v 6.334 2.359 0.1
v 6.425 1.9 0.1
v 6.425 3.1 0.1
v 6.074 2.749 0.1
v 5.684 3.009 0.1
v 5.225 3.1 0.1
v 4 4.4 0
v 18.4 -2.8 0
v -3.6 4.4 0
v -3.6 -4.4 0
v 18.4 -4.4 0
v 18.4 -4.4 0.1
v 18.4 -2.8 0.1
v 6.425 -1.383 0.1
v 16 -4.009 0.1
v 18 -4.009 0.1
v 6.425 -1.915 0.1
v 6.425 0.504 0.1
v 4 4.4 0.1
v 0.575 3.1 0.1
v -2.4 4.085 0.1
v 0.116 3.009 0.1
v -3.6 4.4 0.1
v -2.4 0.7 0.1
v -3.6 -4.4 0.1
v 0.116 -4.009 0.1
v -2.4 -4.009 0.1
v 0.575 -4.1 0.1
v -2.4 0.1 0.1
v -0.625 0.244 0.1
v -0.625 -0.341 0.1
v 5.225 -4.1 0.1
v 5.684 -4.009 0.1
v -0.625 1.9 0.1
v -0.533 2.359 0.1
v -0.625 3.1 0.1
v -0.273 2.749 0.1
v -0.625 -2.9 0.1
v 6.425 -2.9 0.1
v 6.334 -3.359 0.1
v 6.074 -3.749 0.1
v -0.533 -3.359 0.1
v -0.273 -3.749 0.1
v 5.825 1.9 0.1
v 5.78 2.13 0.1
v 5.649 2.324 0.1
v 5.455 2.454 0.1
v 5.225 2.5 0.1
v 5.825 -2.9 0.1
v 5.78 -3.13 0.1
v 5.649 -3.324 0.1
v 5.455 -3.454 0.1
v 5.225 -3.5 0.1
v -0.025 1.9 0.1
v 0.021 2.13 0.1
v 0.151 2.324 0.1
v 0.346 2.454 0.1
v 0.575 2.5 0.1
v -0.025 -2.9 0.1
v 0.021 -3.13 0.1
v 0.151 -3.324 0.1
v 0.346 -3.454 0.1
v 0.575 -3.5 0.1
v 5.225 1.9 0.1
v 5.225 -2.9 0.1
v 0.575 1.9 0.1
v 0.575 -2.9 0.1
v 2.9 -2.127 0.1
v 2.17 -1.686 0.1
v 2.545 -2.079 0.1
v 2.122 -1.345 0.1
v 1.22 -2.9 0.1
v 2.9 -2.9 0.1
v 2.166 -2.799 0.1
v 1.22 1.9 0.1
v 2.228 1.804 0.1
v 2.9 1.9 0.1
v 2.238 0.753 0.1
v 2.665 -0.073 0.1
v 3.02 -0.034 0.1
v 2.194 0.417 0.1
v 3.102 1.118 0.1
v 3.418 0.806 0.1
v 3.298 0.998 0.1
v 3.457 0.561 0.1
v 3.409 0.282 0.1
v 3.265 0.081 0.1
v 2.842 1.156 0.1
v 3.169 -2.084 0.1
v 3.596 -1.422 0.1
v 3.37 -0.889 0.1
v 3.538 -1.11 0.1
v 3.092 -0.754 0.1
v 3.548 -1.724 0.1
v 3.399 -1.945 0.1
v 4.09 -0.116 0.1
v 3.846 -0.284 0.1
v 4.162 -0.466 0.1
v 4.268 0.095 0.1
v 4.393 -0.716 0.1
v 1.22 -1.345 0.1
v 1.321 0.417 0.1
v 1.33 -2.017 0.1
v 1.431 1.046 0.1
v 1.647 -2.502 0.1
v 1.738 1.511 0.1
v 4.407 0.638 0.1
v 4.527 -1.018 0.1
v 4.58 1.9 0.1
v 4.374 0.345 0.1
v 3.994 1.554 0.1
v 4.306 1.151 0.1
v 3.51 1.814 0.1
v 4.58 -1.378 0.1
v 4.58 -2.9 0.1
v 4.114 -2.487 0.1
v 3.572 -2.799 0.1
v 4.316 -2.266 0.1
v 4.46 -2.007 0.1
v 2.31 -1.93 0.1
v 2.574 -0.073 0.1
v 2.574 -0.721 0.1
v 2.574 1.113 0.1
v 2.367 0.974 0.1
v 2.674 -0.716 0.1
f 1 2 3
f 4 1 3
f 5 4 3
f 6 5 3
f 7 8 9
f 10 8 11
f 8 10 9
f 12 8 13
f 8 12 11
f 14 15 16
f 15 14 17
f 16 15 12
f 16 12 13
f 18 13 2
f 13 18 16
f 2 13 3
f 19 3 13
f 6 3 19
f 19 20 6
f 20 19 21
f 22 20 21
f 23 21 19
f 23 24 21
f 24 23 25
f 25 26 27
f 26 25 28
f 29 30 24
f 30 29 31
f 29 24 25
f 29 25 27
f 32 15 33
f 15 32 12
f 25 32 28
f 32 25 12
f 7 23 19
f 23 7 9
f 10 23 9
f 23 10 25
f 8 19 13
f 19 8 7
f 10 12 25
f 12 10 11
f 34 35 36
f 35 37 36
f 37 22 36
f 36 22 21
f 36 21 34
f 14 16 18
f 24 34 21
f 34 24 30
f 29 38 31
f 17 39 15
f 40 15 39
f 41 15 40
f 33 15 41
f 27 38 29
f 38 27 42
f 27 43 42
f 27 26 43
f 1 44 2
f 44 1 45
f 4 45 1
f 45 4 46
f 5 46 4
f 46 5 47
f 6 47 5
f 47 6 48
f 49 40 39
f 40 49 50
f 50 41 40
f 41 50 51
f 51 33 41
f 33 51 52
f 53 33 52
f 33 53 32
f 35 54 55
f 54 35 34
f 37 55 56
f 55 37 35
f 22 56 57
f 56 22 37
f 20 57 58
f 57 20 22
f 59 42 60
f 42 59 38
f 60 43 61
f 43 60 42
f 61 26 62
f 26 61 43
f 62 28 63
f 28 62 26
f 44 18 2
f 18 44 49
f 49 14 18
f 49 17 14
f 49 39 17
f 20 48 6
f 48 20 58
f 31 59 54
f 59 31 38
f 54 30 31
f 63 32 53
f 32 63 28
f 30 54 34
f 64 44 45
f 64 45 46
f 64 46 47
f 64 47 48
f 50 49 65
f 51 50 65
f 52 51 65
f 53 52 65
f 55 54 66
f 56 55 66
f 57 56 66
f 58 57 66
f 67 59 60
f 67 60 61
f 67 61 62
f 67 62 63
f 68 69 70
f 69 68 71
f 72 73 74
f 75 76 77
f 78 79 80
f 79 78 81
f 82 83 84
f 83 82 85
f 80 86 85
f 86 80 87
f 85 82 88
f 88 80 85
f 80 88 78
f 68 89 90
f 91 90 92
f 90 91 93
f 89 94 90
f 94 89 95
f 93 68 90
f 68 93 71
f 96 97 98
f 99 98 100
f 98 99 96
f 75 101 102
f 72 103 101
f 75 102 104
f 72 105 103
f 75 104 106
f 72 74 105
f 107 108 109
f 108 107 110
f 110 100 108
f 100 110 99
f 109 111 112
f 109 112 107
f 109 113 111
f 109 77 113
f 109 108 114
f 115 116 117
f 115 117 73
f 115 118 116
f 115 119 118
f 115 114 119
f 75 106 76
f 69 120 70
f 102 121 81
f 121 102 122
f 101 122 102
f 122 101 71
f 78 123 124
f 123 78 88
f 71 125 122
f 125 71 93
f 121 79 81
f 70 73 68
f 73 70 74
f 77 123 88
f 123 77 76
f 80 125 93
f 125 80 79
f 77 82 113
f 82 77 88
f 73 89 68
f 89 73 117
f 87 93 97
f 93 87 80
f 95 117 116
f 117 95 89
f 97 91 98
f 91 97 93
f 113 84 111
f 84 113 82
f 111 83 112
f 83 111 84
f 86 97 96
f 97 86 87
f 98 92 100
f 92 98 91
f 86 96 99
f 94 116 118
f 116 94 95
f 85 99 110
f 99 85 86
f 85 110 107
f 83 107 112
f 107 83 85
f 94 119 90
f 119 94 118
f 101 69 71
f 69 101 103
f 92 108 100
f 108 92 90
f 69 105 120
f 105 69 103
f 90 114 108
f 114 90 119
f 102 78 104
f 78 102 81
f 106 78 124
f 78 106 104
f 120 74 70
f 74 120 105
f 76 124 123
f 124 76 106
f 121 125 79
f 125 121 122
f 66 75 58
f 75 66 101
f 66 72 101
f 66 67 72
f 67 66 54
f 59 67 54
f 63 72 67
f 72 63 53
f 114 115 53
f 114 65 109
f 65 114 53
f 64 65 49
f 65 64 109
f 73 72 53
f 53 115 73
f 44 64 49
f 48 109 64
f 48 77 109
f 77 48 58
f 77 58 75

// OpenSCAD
// file: ../p/1-4ndis.scad
use <../lib.scad>
function ldraw_lib__1_4ndis() = [
// 0 Disc Negative 0.25
// 0 Name: 1-4ndis.dat
// 0 Author: James Jessiman
// 0 !LDRAW_ORG Primitive UPDATE 2012-01
// 0 !LICENSE Licensed under CC BY 4.0 : see CAreadme.txt
// 
// 0 BFC CERTIFY CCW
  [0,"BFC","CERTIFY"],
  [0,"BFC","CCW"],
// 
// 0 !HISTORY 2002-03-23 [sbliss] Added BFC Statement
// 0 !HISTORY 2002-04-25 [PTadmin] Official Update 2002-02
// 0 !HISTORY 2007-06-22 [PTadmin] Header formatted for Contributor Agreement
// 0 !HISTORY 2008-07-01 [PTadmin] Official Update 2008-01
// 0 !HISTORY 2012-02-16 [Philo] Changed to CCW
// 0 !HISTORY 2012-03-30 [PTadmin] Official Update 2012-01
// 
// 
// 3 16 0.9239 0 0.3827 1 0 0 1 0 1
  [3,16,0.9239,0,0.3827,1,0,0,1,0,1],
// 3 16 0.7071 0 0.7071 0.9239 0 0.3827 1 0 1
  [3,16,0.7071,0,0.7071,0.9239,0,0.3827,1,0,1],
// 3 16 0.3827 0 0.9239 0.7071 0 0.7071 1 0 1
  [3,16,0.3827,0,0.9239,0.7071,0,0.7071,1,0,1],
// 3 16 0 0 1 0.3827 0 0.9239 1 0 1
  [3,16,0,0,1,0.3827,0,0.9239,1,0,1],
];
module ldraw_lib__1_4ndis(step=0, col=false, unit=2/5, alt=false, line=0.2, solid=!$preview)
    makepoly(ldraw_lib__1_4ndis(), step=step, col=col, unit=unit, alt=alt, line=line, solid=solid);
ldraw_lib__1_4ndis(line=0.2);
// file: ../p/3-16ndis.scad
use <../lib.scad>
function ldraw_lib__3_16ndis() = [
// 0 Disc Negative 0.1875
// 0 Name: 3-16ndis.dat
// 0 Author: Guy Vivan [guyvivan]
// 0 !LDRAW_ORG Primitive UPDATE 2009-01
// 0 !LICENSE Licensed under CC BY 2.0 and CC BY 4.0 : see CAreadme.txt
// 
// 0 BFC CERTIFY CCW
  [0,"BFC","CERTIFY"],
  [0,"BFC","CCW"],
// 
// 0 !HISTORY 2009-05-02 [PTadmin] Official Update 2009-01
// 
// 
// 3 16 1 0 1 0.9239 0 0.3827 1 0 0
  [3,16,1,0,1,0.9239,0,0.3827,1,0,0],
// 3 16 1 0 1 0.7071 0 0.7071 0.9239 0 0.3827
  [3,16,1,0,1,0.7071,0,0.7071,0.9239,0,0.3827],
// 3 16 1 0 1 0.3827 0 0.9239 0.7071 0 0.7071
  [3,16,1,0,1,0.3827,0,0.9239,0.7071,0,0.7071],
// 
// 0 end of file
// 
];
module ldraw_lib__3_16ndis(step=0, col=false, unit=2/5, alt=false, line=0.2, solid=!$preview)
    makepoly(ldraw_lib__3_16ndis(), step=step, col=col, unit=unit, alt=alt, line=line, solid=solid);
ldraw_lib__3_16ndis(line=0.2);
// file: ../p/1-4ring1.scad
use <../lib.scad>
function ldraw_lib__1_4ring1() = [
// 0 Ring  1 x 0.25
// 0 Name: 1-4ring1.dat
// 0 Author: Chris Dee [cwdee]
// 0 !LDRAW_ORG Primitive UPDATE 2012-01
// 0 !LICENSE Licensed under CC BY 2.0 and CC BY 4.0 : see CAreadme.txt
// 
// 0 BFC CERTIFY CCW
  [0,"BFC","CERTIFY"],
  [0,"BFC","CCW"],
// 
// 0 !HISTORY 2000-05-07 [PTadmin] Official Update 2000-01
// 0 !HISTORY 2002-11-22 [hafhead] Added BFC statement
// 0 !HISTORY 2002-11-30 [PTadmin] Official Update 2002-05
// 0 !HISTORY 2007-06-22 [PTadmin] Header formatted for Contributor Agreement
// 0 !HISTORY 2008-07-01 [PTadmin] Official Update 2008-01
// 0 !HISTORY 2012-02-16 [Philo] Changed to CCW
// 0 !HISTORY 2012-03-30 [PTadmin] Official Update 2012-01
// 
// 
// 4 16 2 0 0 1.8478 0 0.7654 0.9239 0 0.3827 1 0 0
  [4,16,2,0,0,1.8478,0,0.7654,0.9239,0,0.3827,1,0,0],
// 4 16 1.8478 0 0.7654 1.4142 0 1.4142 0.7071 0 0.7071 0.9239 0 0.3827
  [4,16,1.8478,0,0.7654,1.4142,0,1.4142,0.7071,0,0.7071,0.9239,0,0.3827],
// 4 16 1.4142 0 1.4142 0.7654 0 1.8478 0.3827 0 0.9239 0.7071 0 0.7071
  [4,16,1.4142,0,1.4142,0.7654,0,1.8478,0.3827,0,0.9239,0.7071,0,0.7071],
// 4 16 0.7654 0 1.8478 0 0 2 0 0 1 0.3827 0 0.9239
  [4,16,0.7654,0,1.8478,0,0,2,0,0,1,0.3827,0,0.9239],
];
module ldraw_lib__1_4ring1(step=0, col=false, unit=2/5, alt=false, line=0.2, solid=!$preview)
    makepoly(ldraw_lib__1_4ring1(), step=step, col=col, unit=unit, alt=alt, line=line, solid=solid);
ldraw_lib__1_4ring1(line=0.2);
// file: ../p/1-4disc.scad
use <../lib.scad>
function ldraw_lib__1_4disc() = [
// 0 Disc 0.25
// 0 Name: 1-4disc.dat
// 0 Author: James Jessiman
// 0 !LDRAW_ORG Primitive UPDATE 2002-02
// 0 !LICENSE Licensed under CC BY 4.0 : see CAreadme.txt
// 
// 0 BFC CERTIFY CCW
  [0,"BFC","CERTIFY"],
  [0,"BFC","CCW"],
// 
// 0 !HISTORY 2002-03-23 [sbliss] Added BFC statement.
// 0 !HISTORY 2002-04-25 [PTadmin] Official Update 2002-02
// 0 !HISTORY 2007-06-22 [PTadmin] Header formatted for Contributor Agreement
// 0 !HISTORY 2008-07-01 [PTadmin] Official Update 2008-01
// 
// 
// 3 16 0 0 0 1 0 0 0.9239 0 0.3827
  [3,16,0,0,0,1,0,0,0.9239,0,0.3827],
// 3 16 0 0 0 0.9239 0 0.3827 0.7071 0 0.7071
  [3,16,0,0,0,0.9239,0,0.3827,0.7071,0,0.7071],
// 3 16 0 0 0 0.7071 0 0.7071 0.3827 0 0.9239
  [3,16,0,0,0,0.7071,0,0.7071,0.3827,0,0.9239],
// 3 16 0 0 0 0.3827 0 0.9239 0 0 1
  [3,16,0,0,0,0.3827,0,0.9239,0,0,1],
// 0
];
module ldraw_lib__1_4disc(step=0, col=false, unit=2/5, alt=false, line=0.2, solid=!$preview)
    makepoly(ldraw_lib__1_4disc(), step=step, col=col, unit=unit, alt=alt, line=line, solid=solid);
ldraw_lib__1_4disc(line=0.2);
// file: ../p/type-swiss721bt-bold-n3.scad
use <../lib.scad>
function ldraw_lib__type_swiss721bt_bold_n3() = [
// 0 Type Swiss721BT Number "3" Bold
// 0 Name: type-swiss721bt-bold-n3.dat
// 0 Author: Ulrich Röder [UR]
// 0 !LDRAW_ORG Primitive UPDATE 2019-01
// 0 !LICENSE Licensed under CC BY 4.0 : see CAreadme.txt
// 
// 0 BFC CERTIFY CCW
  [0,"BFC","CERTIFY"],
  [0,"BFC","CCW"],
// 
// 0 !HISTORY 2019-06-28 [PTadmin] Official Update 2019-01
// 
// 
// 0 // Main
// 4 16 -.074 0 -.329 0 0 -.339 -.162 0 -.176 -.152 0 -.247
  [4,16,-.074,0,-.329,0,0,-.339,-.162,0,-.176,-.152,0,-.247],
// 3 16 -.35 0 -.5 0 0 -.5 -.153 0 -.479
  [3,16,-.35,0,-.5,0,0,-.5,-.153,0,-.479],
// 3 16 -.35 0 .5 -.14 0 .48 0 0 .5
  [3,16,-.35,0,.5,-.14,0,.48,0,0,.5],
// 4 16 -.049 0 .089 .025 0 .097 -.138 0 .261 -.147 0 .191
  [4,16,-.049,0,.089,.025,0,.097,-.138,0,.261,-.147,0,.191],
// 4 16 .116 0 .221 .108 0 .272 .083 0 .312 .042 0 .337
  [4,16,.116,0,.221,.108,0,.272,.083,0,.312,.042,0,.337],
// 4 16 .076 0 .121 .106 0 .163 .116 0 .221 .025 0 .097
  [4,16,.076,0,.121,.106,0,.163,.116,0,.221,.025,0,.097],
// 3 16 .116 0 .221 .042 0 .337 -.012 0 .345
  [3,16,.116,0,.221,.042,0,.337,-.012,0,.345],
// 4 16 -.138 0 .261 .025 0 .097 .116 0 .221 -.012 0 .345
  [4,16,-.138,0,.261,.025,0,.097,.116,0,.221,-.012,0,.345],
// 3 16 0 0 -.339 .056 0 -.33 .145 0 -.192
  [3,16,0,0,-.339,.056,0,-.33,.145,0,-.192],
// 4 16 .098 0 -.081 .04 0 -.053 .145 0 -.192 .133 0 -.127
  [4,16,.098,0,-.081,.04,0,-.053,.145,0,-.192,.133,0,-.127],
// 4 16 .104 0 -.301 .135 0 -.255 .145 0 -.192 .056 0 -.33
  [4,16,.104,0,-.301,.135,0,-.255,.145,0,-.192,.056,0,-.33],
// 4 16 -.162 0 -.176 0 0 -.339 .145 0 -.192 .04 0 -.053
  [4,16,-.162,0,-.176,0,0,-.339,.145,0,-.192,.04,0,-.053],
// 3 16 .248 0 .08 .197 0 .045 .263 0 .007
  [3,16,.248,0,.08,.197,0,.045,.263,0,.007],
// 4 16 .311 0 -.045 .285 0 .124 .248 0 .08 .263 0 .007
  [4,16,.311,0,-.045,.285,0,.124,.248,0,.08,.263,0,.007],
// 3 16 -.35 0 .5 -.35 0 -.176 -.329 0 .191
  [3,16,-.35,0,.5,-.35,0,-.176,-.329,0,.191],
// 3 16 -.35 0 -.5 -.327 0 -.316 -.35 0 -.176
  [3,16,-.35,0,-.5,-.327,0,-.316,-.35,0,-.176],
// 3 16 -.35 0 .5 -.329 0 .191 -.306 0 .322
  [3,16,-.35,0,.5,-.329,0,.191,-.306,0,.322],
// 3 16 -.35 0 -.5 -.261 0 -.417 -.327 0 -.316
  [3,16,-.35,0,-.5,-.261,0,-.417,-.327,0,-.316],
// 3 16 -.35 0 .5 -.306 0 .322 -.242 0 .419
  [3,16,-.35,0,.5,-.306,0,.322,-.242,0,.419],
// 3 16 -.35 0 -.5 -.153 0 -.479 -.261 0 -.417
  [3,16,-.35,0,-.5,-.153,0,-.479,-.261,0,-.417],
// 4 16 .35 0 .5 .314 0 .237 .307 0 .176 .339 0 -.108
  [4,16,.35,0,.5,.314,0,.237,.307,0,.176,.339,0,-.108],
// 4 16 .285 0 .124 .311 0 -.045 .339 0 -.108 .307 0 .176
  [4,16,.285,0,.124,.311,0,-.045,.339,0,-.108,.307,0,.176],
// 3 16 .35 0 .5 .228 0 .428 .293 0 .344
  [3,16,.35,0,.5,.228,0,.428,.293,0,.344],
// 3 16 .35 0 .5 .293 0 .344 .314 0 .237
  [3,16,.35,0,.5,.293,0,.344,.314,0,.237],
// 3 16 .35 0 .5 .127 0 .482 .228 0 .428
  [3,16,.35,0,.5,.127,0,.482,.228,0,.428],
// 3 16 .35 0 .5 0 0 .5 .127 0 .482
  [3,16,.35,0,.5,0,0,.5,.127,0,.482],
// 3 16 .35 0 .5 .339 0 -.108 .35 0 -.183
  [3,16,.35,0,.5,.339,0,-.108,.35,0,-.183],
// 3 16 .35 0 -.5 .253 0 -.414 .14 0 -.479
  [3,16,.35,0,-.5,.253,0,-.414,.14,0,-.479],
// 3 16 .35 0 -.5 .14 0 -.479 0 0 -.5
  [3,16,.35,0,-.5,.14,0,-.479,0,0,-.5],
// 3 16 .35 0 -.5 .295 0 -.368 .253 0 -.414
  [3,16,.35,0,-.5,.295,0,-.368,.253,0,-.414],
// 3 16 .35 0 -.5 .325 0 -.314 .295 0 -.368
  [3,16,.35,0,-.5,.325,0,-.314,.295,0,-.368],
// 3 16 .35 0 -.5 .35 0 -.183 .325 0 -.314
  [3,16,.35,0,-.5,.35,0,-.183,.325,0,-.314],
// 3 16 -.35 0 .5 -.242 0 .419 -.14 0 .48
  [3,16,-.35,0,.5,-.242,0,.419,-.14,0,.48],
// 3 16 -.152 0 -.247 -.123 0 -.298 -.074 0 -.329
  [3,16,-.152,0,-.247,-.123,0,-.298,-.074,0,-.329],
// 4 16 -.068 0 -.046 -.068 0 .089 -.147 0 .191 -.329 0 .191
  [4,16,-.068,0,-.046,-.068,0,.089,-.147,0,.191,-.329,0,.191],
// 4 16 -.162 0 -.176 -.068 0 -.046 -.329 0 .191 -.35 0 -.176
  [4,16,-.162,0,-.176,-.068,0,-.046,-.329,0,.191,-.35,0,-.176],
// 4 16 -.012 0 .345 -.068 0 .336 -.111 0 .307 -.138 0 .261
  [4,16,-.012,0,.345,-.068,0,.336,-.111,0,.307,-.138,0,.261],
// 4 16 .04 0 -.053 -.047 0 -.045 -.068 0 -.046 -.162 0 -.176
  [4,16,.04,0,-.053,-.047,0,-.045,-.068,0,-.046,-.162,0,-.176],
// 3 16 -.068 0 .089 -.049 0 .089 -.147 0 .191
  [3,16,-.068,0,.089,-.049,0,.089,-.147,0,.191],
// 
// 0 // Black
// 4 0 0 0 -.339 -.074 0 -.329 -.153 0 -.479 0 0 -.5
  [4,0,0,0,-.339,-.074,0,-.329,-.153,0,-.479,0,0,-.5],
// 4 0 -.14 0 .48 -.068 0 .336 -.012 0 .345 0 0 .5
  [4,0,-.14,0,.48,-.068,0,.336,-.012,0,.345,0,0,.5],
// 4 0 -.049 0 .089 -.047 0 -.045 .04 0 -.053 .025 0 .097
  [4,0,-.049,0,.089,-.047,0,-.045,.04,0,-.053,.025,0,.097],
// 4 0 .127 0 .482 0 0 .5 -.012 0 .345 .042 0 .337
  [4,0,.127,0,.482,0,0,.5,-.012,0,.345,.042,0,.337],
// 4 0 .14 0 -.479 .056 0 -.33 0 0 -.339 0 0 -.5
  [4,0,.14,0,-.479,.056,0,-.33,0,0,-.339,0,0,-.5],
// 4 0 .197 0 .045 .076 0 .121 .025 0 .097 .04 0 -.053
  [4,0,.197,0,.045,.076,0,.121,.025,0,.097,.04,0,-.053],
// 4 0 .253 0 -.414 .104 0 -.301 .056 0 -.33 .14 0 -.479
  [4,0,.253,0,-.414,.104,0,-.301,.056,0,-.33,.14,0,-.479],
// 4 0 .263 0 .007 .197 0 .045 .04 0 -.053 .098 0 -.081
  [4,0,.263,0,.007,.197,0,.045,.04,0,-.053,.098,0,-.081],
// 4 0 .042 0 .337 .083 0 .312 .228 0 .428 .127 0 .482
  [4,0,.042,0,.337,.083,0,.312,.228,0,.428,.127,0,.482],
// 4 0 .293 0 .344 .228 0 .428 .083 0 .312 .108 0 .272
  [4,0,.293,0,.344,.228,0,.428,.083,0,.312,.108,0,.272],
// 4 0 .076 0 .121 .197 0 .045 .248 0 .08 .106 0 .163
  [4,0,.076,0,.121,.197,0,.045,.248,0,.08,.106,0,.163],
// 4 0 .311 0 -.045 .263 0 .007 .098 0 -.081 .133 0 -.127
  [4,0,.311,0,-.045,.263,0,.007,.098,0,-.081,.133,0,-.127],
// 3 0 .106 0 .163 .248 0 .08 .285 0 .124
  [3,0,.106,0,.163,.248,0,.08,.285,0,.124],
// 4 0 .104 0 -.301 .253 0 -.414 .295 0 -.368 .135 0 -.255
  [4,0,.104,0,-.301,.253,0,-.414,.295,0,-.368,.135,0,-.255],
// 4 0 .106 0 .163 .285 0 .124 .307 0 .176 .116 0 .221
  [4,0,.106,0,.163,.285,0,.124,.307,0,.176,.116,0,.221],
// 3 0 .116 0 .221 .307 0 .176 .314 0 .237
  [3,0,.116,0,.221,.307,0,.176,.314,0,.237],
// 4 0 .293 0 .344 .108 0 .272 .116 0 .221 .314 0 .237
  [4,0,.293,0,.344,.108,0,.272,.116,0,.221,.314,0,.237],
// 4 0 .295 0 -.368 .325 0 -.314 .145 0 -.192 .135 0 -.255
  [4,0,.295,0,-.368,.325,0,-.314,.145,0,-.192,.135,0,-.255],
// 4 0 -.162 0 -.176 -.35 0 -.176 -.327 0 -.316 -.152 0 -.247
  [4,0,-.162,0,-.176,-.35,0,-.176,-.327,0,-.316,-.152,0,-.247],
// 4 0 .311 0 -.045 .133 0 -.127 .145 0 -.192 .339 0 -.108
  [4,0,.311,0,-.045,.133,0,-.127,.145,0,-.192,.339,0,-.108],
// 4 0 -.123 0 -.298 -.152 0 -.247 -.327 0 -.316 -.261 0 -.417
  [4,0,-.123,0,-.298,-.152,0,-.247,-.327,0,-.316,-.261,0,-.417],
// 4 0 .339 0 -.108 .145 0 -.192 .325 0 -.314 .35 0 -.183
  [4,0,.339,0,-.108,.145,0,-.192,.325,0,-.314,.35,0,-.183],
// 4 0 -.329 0 .191 -.147 0 .191 -.138 0 .261 -.306 0 .322
  [4,0,-.329,0,.191,-.147,0,.191,-.138,0,.261,-.306,0,.322],
// 4 0 -.111 0 .307 -.242 0 .419 -.306 0 .322 -.138 0 .261
  [4,0,-.111,0,.307,-.242,0,.419,-.306,0,.322,-.138,0,.261],
// 4 0 -.261 0 -.417 -.153 0 -.479 -.074 0 -.329 -.123 0 -.298
  [4,0,-.261,0,-.417,-.153,0,-.479,-.074,0,-.329,-.123,0,-.298],
// 4 0 -.242 0 .419 -.111 0 .307 -.068 0 .336 -.14 0 .48
  [4,0,-.242,0,.419,-.111,0,.307,-.068,0,.336,-.14,0,.48],
// 4 0 -.049 0 .089 -.068 0 .089 -.068 0 -.046 -.047 0 -.045
  [4,0,-.049,0,.089,-.068,0,.089,-.068,0,-.046,-.047,0,-.045],
];
module ldraw_lib__type_swiss721bt_bold_n3(step=0, col=false, unit=2/5, alt=false, line=0.2, solid=!$preview)
    makepoly(ldraw_lib__type_swiss721bt_bold_n3(), step=step, col=col, unit=unit, alt=alt, line=line, solid=solid);
ldraw_lib__type_swiss721bt_bold_n3(line=0.2);
// file: s/821435as03.scad
use <../../lib.scad>
use <../../p/1-4ndis.scad>
function ldraw_lib__s__821435as03() = [
// 0 ~Sticker Sloped Body for Racing Number
// 0 Name: s\821435as03.dat
// 0 Author: Ulrich Röder [UR]
// 0 !LDRAW_ORG Subpart UPDATE 2019-01
// 0 !LICENSE Licensed under CC BY 4.0 : see CAreadme.txt
// 
// 0 BFC CERTIFY CCW
  [0,"BFC","CERTIFY"],
  [0,"BFC","CCW"],
// 
// 0 !HISTORY 2019-06-28 [PTadmin] Official Update 2019-01
// 
// 
// 0 // Main
// 1 16 13.063 -.25 4.75 3 0 0 0 1 0 0 0 3 1-4ndis.dat
  [1,16,13.063,-.25,4.75,3,0,0,0,1,0,0,0,3, ldraw_lib__1_4ndis()],
// 3 16 10 0 11 46 0 -7 -9 0 11
  [3,16,10,0,11,46,0,-7,-9,0,11],
// 4 16 -9 0 -11 -9 0 11 46 0 -7 46 0 -11
  [4,16,-9,0,-11,-9,0,11,46,0,-7,46,0,-11],
// 4 16 46 -.25 -11 46 0 -11 46 0 -7 46 -.25 -7
  [4,16,46,-.25,-11,46,0,-11,46,0,-7,46,-.25,-7],
// 4 16 16.063 -.25 -4.788 40 -.25 -10.022 45 -.25 -10.022 16.063 -.25 -3.458
  [4,16,16.063,-.25,-4.788,40,-.25,-10.022,45,-.25,-10.022,16.063,-.25,-3.458],
// 3 16 45 -.25 -10.022 40 -.25 -10.022 46 -.25 -11
  [3,16,45,-.25,-10.022,40,-.25,-10.022,46,-.25,-11],
// 3 16 45 -.25 -10.022 46 -.25 -11 46 -.25 -7
  [3,16,45,-.25,-10.022,46,-.25,-11,46,-.25,-7],
// 4 16 16.063 -.25 4.75 16.063 -.25 1.261 45 -.25 -10.022 46 -.25 -7
  [4,16,16.063,-.25,4.75,16.063,-.25,1.261,45,-.25,-10.022,46,-.25,-7],
// 3 16 16.063 -.25 4.75 46 -.25 -7 16.063 -.25 7.75
  [3,16,16.063,-.25,4.75,46,-.25,-7,16.063,-.25,7.75],
// 3 16 10 -.25 11 16.063 -.25 7.75 46 -.25 -7
  [3,16,10,-.25,11,16.063,-.25,7.75,46,-.25,-7],
// 3 16 13.063 -.25 7.75 16.063 -.25 7.75 10 -.25 11
  [3,16,13.063,-.25,7.75,16.063,-.25,7.75,10,-.25,11],
// 4 16 -6 -.25 10.213 1.438 -.25 7.75 13.063 -.25 7.75 10 -.25 11
  [4,16,-6,-.25,10.213,1.438,-.25,7.75,13.063,-.25,7.75,10,-.25,11],
// 3 16 .2899 -.25 7.5217 1.438 -.25 7.75 -6 -.25 10.213
  [3,16,.2899,-.25,7.5217,1.438,-.25,7.75,-6,-.25,10.213],
// 3 16 -9 -.25 11 -6 -.25 10.213 10 -.25 11
  [3,16,-9,-.25,11,-6,-.25,10.213,10,-.25,11],
// 4 16 -9 -.25 -11 -6 -.25 1.75 -6 -.25 10.213 -9 -.25 11
  [4,16,-9,-.25,-11,-6,-.25,1.75,-6,-.25,10.213,-9,-.25,11],
// 4 16 1.438 -.25 -10.25 .2899 -.25 -10.0217 -6 -.25 -10.022 -9 -.25 -11
  [4,16,1.438,-.25,-10.25,.2899,-.25,-10.0217,-6,-.25,-10.022,-9,-.25,-11],
// 4 16 -1.563 -.25 .61 -6 -.25 1.75 -6 -.25 .25 -1.563 -.25 -.853
  [4,16,-1.563,-.25,.61,-6,-.25,1.75,-6,-.25,.25,-1.563,-.25,-.853],
// 3 16 -6 -.25 .25 -6 -.25 1.75 -9 -.25 -11
  [3,16,-6,-.25,.25,-6,-.25,1.75,-9,-.25,-11],
// 3 16 -6 -.25 .25 -9 -.25 -11 -6 -.25 -10.022
  [3,16,-6,-.25,.25,-9,-.25,-11,-6,-.25,-10.022],
// 4 16 40 -.25 -10.022 14.2111 -.25 -10.0217 13.063 -.25 -10.25 46 -.25 -11
  [4,16,40,-.25,-10.022,14.2111,-.25,-10.0217,13.063,-.25,-10.25,46,-.25,-11],
// 4 16 1.438 -.25 -10.25 -9 -.25 -11 46 -.25 -11 13.063 -.25 -10.25
  [4,16,1.438,-.25,-10.25,-9,-.25,-11,46,-.25,-11,13.063,-.25,-10.25],
// 4 16 -9 -.25 11 10 -.25 11 10 0 11 -9 0 11
  [4,16,-9,-.25,11,10,-.25,11,10,0,11,-9,0,11],
// 4 16 -9 0 11 -9 0 -11 -9 -.25 -11 -9 -.25 11
  [4,16,-9,0,11,-9,0,-11,-9,-.25,-11,-9,-.25,11],
// 4 16 10 -.25 11 46 -.25 -7 46 0 -7 10 0 11
  [4,16,10,-.25,11,46,-.25,-7,46,0,-7,10,0,11],
// 4 16 46 0 -11 46 -.25 -11 -9 -.25 -11 -9 0 -11
  [4,16,46,0,-11,46,-.25,-11,-9,-.25,-11,-9,0,-11],
];
module ldraw_lib__s__821435as03(step=0, col=false, unit=2/5, alt=false, line=0.2, solid=!$preview)
    makepoly(ldraw_lib__s__821435as03(), step=step, col=col, unit=unit, alt=alt, line=line, solid=solid);
ldraw_lib__s__821435as03(line=0.2);
// file: s/821435as02.scad
use <../../lib.scad>
use <../../p/3-16ndis.scad>
function ldraw_lib__s__821435as02() = [
// 0 ~Sticker Upper Triangle with Cutout for Racing Number
// 0 Name: s\821435as02.dat
// 0 Author: Ulrich Röder [UR]
// 0 !LDRAW_ORG Subpart UPDATE 2019-01
// 0 !LICENSE Licensed under CC BY 4.0 : see CAreadme.txt
// 
// 0 BFC CERTIFY CCW
  [0,"BFC","CERTIFY"],
  [0,"BFC","CCW"],
// 
// 0 !HISTORY 2019-06-28 [PTadmin] Official Update 2019-01
// 
// 
// 0 // Main
// 1 16 1.438 -.25 4.75 -3 0 0 0 1 0 0 0 3 3-16ndis.dat
  [1,16,1.438,-.25,4.75,-3,0,0,0,1,0,0,0,3, ldraw_lib__3_16ndis()],
// 3 16 -1.562 -.25 7.75 .2899 -.25 7.5217 -6 -.25 10.213
  [3,16,-1.562,-.25,7.75,.2899,-.25,7.5217,-6,-.25,10.213],
// 3 16 -1.562 -.25 7.75 -6 -.25 10.213 -1.562 -.25 4.75
  [3,16,-1.562,-.25,7.75,-6,-.25,10.213,-1.562,-.25,4.75],
// 3 16 16.063 -.25 -3.458 45 -.25 -10.022 16.063 -.25 1.261
  [3,16,16.063,-.25,-3.458,45,-.25,-10.022,16.063,-.25,1.261],
// 4 16 -6 -.25 1.75 -1.563 -.25 .61 -1.562 -.25 4.75 -6 -.25 10.213
  [4,16,-6,-.25,1.75,-1.563,-.25,.61,-1.562,-.25,4.75,-6,-.25,10.213],
];
module ldraw_lib__s__821435as02(step=0, col=false, unit=2/5, alt=false, line=0.2, solid=!$preview)
    makepoly(ldraw_lib__s__821435as02(), step=step, col=col, unit=unit, alt=alt, line=line, solid=solid);
ldraw_lib__s__821435as02(line=0.2);
// file: s/821435as01.scad
use <../../lib.scad>
use <../../p/1-4disc.scad>
use <../../p/1-4ring1.scad>
function ldraw_lib__s__821435as01() = [
// 0 ~Sticker Lower Triangle and Racing Number Frame
// 0 Name: s\821435as01.dat
// 0 Author: Ulrich Röder [UR]
// 0 !LDRAW_ORG Subpart UPDATE 2019-01
// 0 !LICENSE Licensed under CC BY 4.0 : see CAreadme.txt
// 
// 0 BFC CERTIFY CCW
  [0,"BFC","CERTIFY"],
  [0,"BFC","CCW"],
// 
// 0 !HISTORY 2019-06-28 [PTadmin] Official Update 2019-01
// 
// 
// 0 // Main
// 
// 3 16 -6 -0.25 0.25 -1.562 -0.25 -7.25 -1.563 -0.25 -0.853
  [3,16,-6,-0.25,0.25,-1.562,-0.25,-7.25,-1.563,-0.25,-0.853],
// 3 16 16.063 -0.25 -4.788 16.063 -0.25 -7.25 40 -0.25 -10.022
  [3,16,16.063,-0.25,-4.788,16.063,-0.25,-7.25,40,-0.25,-10.022],
// 3 16 15.8347 -0.25 -8.3981 40 -0.25 -10.022 16.063 -0.25 -7.25
  [3,16,15.8347,-0.25,-8.3981,40,-0.25,-10.022,16.063,-0.25,-7.25],
// 3 16 15.1843 -0.25 -9.3713 40 -0.25 -10.022 15.8347 -0.25 -8.3981
  [3,16,15.1843,-0.25,-9.3713,40,-0.25,-10.022,15.8347,-0.25,-8.3981],
// 3 16 14.2111 -0.25 -10.0217 40 -0.25 -10.022 15.1843 -0.25 -9.3713
  [3,16,14.2111,-0.25,-10.0217,40,-0.25,-10.022,15.1843,-0.25,-9.3713],
// 4 16 -6 -0.25 0.25 -6 -0.25 -10.022 -1.3337 -0.25 -8.3981 -1.562 -0.25 -7.25
  [4,16,-6,-0.25,0.25,-6,-0.25,-10.022,-1.3337,-0.25,-8.3981,-1.562,-0.25,-7.25],
// 3 16 -6 -0.25 -10.022 -0.6833 -0.25 -9.3713 -1.3337 -0.25 -8.3981
  [3,16,-6,-0.25,-10.022,-0.6833,-0.25,-9.3713,-1.3337,-0.25,-8.3981],
// 3 16 -6 -0.25 -10.022 0.2899 -0.25 -10.0217 -0.6833 -0.25 -9.3713
  [3,16,-6,-0.25,-10.022,0.2899,-0.25,-10.0217,-0.6833,-0.25,-9.3713],
// 
// 0 // Black
// 1 0 13.063 -.25 4.75 1.5 0 0 0 1 0 0 0 1.5 1-4ring1.dat
  [1,0,13.063,-.25,4.75,1.5,0,0,0,1,0,0,0,1.5, ldraw_lib__1_4ring1()],
// 1 0 13.063 -.25 -7.25 1.5 0 0 0 1 0 0 0 -1.5 1-4ring1.dat
  [1,0,13.063,-.25,-7.25,1.5,0,0,0,1,0,0,0,-1.5, ldraw_lib__1_4ring1()],
// 1 0 1.438 -.25 4.75 -1.5 0 0 0 1 0 0 0 1.5 1-4ring1.dat
  [1,0,1.438,-.25,4.75,-1.5,0,0,0,1,0,0,0,1.5, ldraw_lib__1_4ring1()],
// 1 0 1.438 -.25 -7.25 -1.5 0 0 0 1 0 0 0 -1.5 1-4ring1.dat
  [1,0,1.438,-.25,-7.25,-1.5,0,0,0,1,0,0,0,-1.5, ldraw_lib__1_4ring1()],
// 4 0 14.563 -0.25 4.75 14.563 -0.25 -7.25 16.063 -0.25 1.261 16.063 -0.25 4.75
  [4,0,14.563,-0.25,4.75,14.563,-0.25,-7.25,16.063,-0.25,1.261,16.063,-0.25,4.75],
// 3 0 14.563 -0.25 -7.25 16.063 -0.25 -3.458 16.063 -0.25 1.261
  [3,0,14.563,-0.25,-7.25,16.063,-0.25,-3.458,16.063,-0.25,1.261],
// 3 0 14.563 -0.25 -7.25 16.063 -0.25 -4.788 16.063 -0.25 -3.458
  [3,0,14.563,-0.25,-7.25,16.063,-0.25,-4.788,16.063,-0.25,-3.458],
// 3 0 14.563 -0.25 -7.25 16.063 -0.25 -7.25 16.063 -0.25 -4.788
  [3,0,14.563,-0.25,-7.25,16.063,-0.25,-7.25,16.063,-0.25,-4.788],
// 4 0 13.063 -0.25 6.25 13.063 -0.25 7.75 1.438 -0.25 7.75 1.438 -0.25 6.25
  [4,0,13.063,-0.25,6.25,13.063,-0.25,7.75,1.438,-0.25,7.75,1.438,-0.25,6.25],
// 4 0 -0.062 -0.25 4.75 -1.563 -0.25 -0.853 -1.562 -0.25 -7.25 -0.062 -0.25 -7.25
  [4,0,-0.062,-0.25,4.75,-1.563,-0.25,-0.853,-1.562,-0.25,-7.25,-0.062,-0.25,-7.25],
// 3 0 -0.062 -0.25 4.75 -1.563 -0.25 0.61 -1.563 -0.25 -0.853
  [3,0,-0.062,-0.25,4.75,-1.563,-0.25,0.61,-1.563,-0.25,-0.853],
// 4 0 1.438 -0.25 -10.25 13.063 -0.25 -10.25 13.063 -0.25 -8.75 1.438 -0.25 -8.75
  [4,0,1.438,-0.25,-10.25,13.063,-0.25,-10.25,13.063,-0.25,-8.75,1.438,-0.25,-8.75],
// 3 0 -1.563 -0.25 0.61 -0.062 -0.25 4.75 -1.562 -0.25 4.75
  [3,0,-1.563,-0.25,0.61,-0.062,-0.25,4.75,-1.562,-0.25,4.75],
// 
// 0 // White
// 1 15 13.063 -.25 4.75 1.5 0 0 0 1 0 0 0 1.5 1-4disc.dat
  [1,15,13.063,-.25,4.75,1.5,0,0,0,1,0,0,0,1.5, ldraw_lib__1_4disc()],
// 1 15 13.063 -.25 -7.25 1.5 0 0 0 1 0 0 0 -1.5 1-4disc.dat
  [1,15,13.063,-.25,-7.25,1.5,0,0,0,1,0,0,0,-1.5, ldraw_lib__1_4disc()],
// 1 15 1.438 -.25 4.75 -1.5 0 0 0 1 0 0 0 1.5 1-4disc.dat
  [1,15,1.438,-.25,4.75,-1.5,0,0,0,1,0,0,0,1.5, ldraw_lib__1_4disc()],
// 1 15 1.438 -.25 -7.25 -1.5 0 0 0 1 0 0 0 -1.5 1-4disc.dat
  [1,15,1.438,-.25,-7.25,-1.5,0,0,0,1,0,0,0,-1.5, ldraw_lib__1_4disc()],
];
module ldraw_lib__s__821435as01(step=0, col=false, unit=2/5, alt=false, line=0.2, solid=!$preview)
    makepoly(ldraw_lib__s__821435as01(), step=step, col=col, unit=unit, alt=alt, line=line, solid=solid);
ldraw_lib__s__821435as01(line=0.2);
// main file
use <../lib.scad>
use <s/821435as01.scad>
use <s/821435as02.scad>
use <s/821435as03.scad>
use <../p/type-swiss721bt-bold-n3.scad>
function ldraw_lib__821435e() = [
// 0 Sticker with Black/Red Triangles and Racing Number "3", Right
// 0 Name: 821435e.dat
// 0 Author: Ulrich Röder [UR]
// 0 !LDRAW_ORG Part UPDATE 2019-01
// 0 !LICENSE Licensed under CC BY 4.0 : see CAreadme.txt
// 
// 0 BFC CERTIFY CCW
  [0,"BFC","CERTIFY"],
  [0,"BFC","CCW"],
// 
// 0 !KEYWORDS cup, Racers, Set 6539
// 
// 0 !HISTORY 2019-06-28 [PTadmin] Official Update 2019-01
// 
// 
// 0 // Main
// 1 16 0 0 0 1 0 0 0 1 0 0 0 1 s\821435as03.dat
  [1,16,0,0,0,1,0,0,0,1,0,0,0,1, ldraw_lib__s__821435as03()],
// 
// 0 // Black
// 1 0 0 0 0 1 0 0 0 1 0 0 0 1 s\821435as02.dat
  [1,0,0,0,0,1,0,0,0,1,0,0,0,1, ldraw_lib__s__821435as02()],
// 
// 0 // Red
// 1 4 0 0 0 1 0 0 0 1 0 0 0 1 s\821435as01.dat
  [1,4,0,0,0,1,0,0,0,1,0,0,0,1, ldraw_lib__s__821435as01()],
// 
// 0 // White
// 1 15 7.25 -.25 -1.25 12 0 0 0 1 0 0 0 12 type-swiss721bt-bold-n3.dat
  [1,15,7.25,-.25,-1.25,12,0,0,0,1,0,0,0,12, ldraw_lib__type_swiss721bt_bold_n3()],
// 4 15 3.05 -.25 -3.362 3.05 -.25 4.75 1.438 -.25 6.25 1.438 -.25 4.75
  [4,15,3.05,-.25,-3.362,3.05,-.25,4.75,1.438,-.25,6.25,1.438,-.25,4.75],
// 3 15 1.438 -.25 4.75 3.05 -.25 -7.25 3.05 -.25 -3.362
  [3,15,1.438,-.25,4.75,3.05,-.25,-7.25,3.05,-.25,-3.362],
// 4 15 1.438 -.25 4.75 -.062 -.25 4.75 1.438 -.25 -7.25 3.05 -.25 -7.25
  [4,15,1.438,-.25,4.75,-.062,-.25,4.75,1.438,-.25,-7.25,3.05,-.25,-7.25],
// 3 15 -.062 -.25 -7.25 1.438 -.25 -7.25 -.062 -.25 4.75
  [3,15,-.062,-.25,-7.25,1.438,-.25,-7.25,-.062,-.25,4.75],
// 4 15 13.063 -.25 -8.75 3.05 -.25 -7.25 1.438 -.25 -7.25 1.438 -.25 -8.75
  [4,15,13.063,-.25,-8.75,3.05,-.25,-7.25,1.438,-.25,-7.25,1.438,-.25,-8.75],
// 3 15 11.45 -.25 -3.446 11.45 -.25 -7.25 13.063 -.25 -8.75
  [3,15,11.45,-.25,-3.446,11.45,-.25,-7.25,13.063,-.25,-8.75],
// 4 15 11.45 -.25 4.75 11.45 -.25 -3.446 13.063 -.25 -8.75 13.063 -.25 -7.25
  [4,15,11.45,-.25,4.75,11.45,-.25,-3.446,13.063,-.25,-8.75,13.063,-.25,-7.25],
// 4 15 13.063 -.25 4.75 11.45 -.25 4.75 13.063 -.25 -7.25 14.563 -.25 -7.25
  [4,15,13.063,-.25,4.75,11.45,-.25,4.75,13.063,-.25,-7.25,14.563,-.25,-7.25],
// 3 15 7.25 -.25 -7.25 3.05 -.25 -7.25 13.063 -.25 -8.75
  [3,15,7.25,-.25,-7.25,3.05,-.25,-7.25,13.063,-.25,-8.75],
// 3 15 13.063 -.25 -8.75 11.45 -.25 -7.25 7.25 -.25 -7.25
  [3,15,13.063,-.25,-8.75,11.45,-.25,-7.25,7.25,-.25,-7.25],
// 3 15 14.563 -.25 4.75 13.063 -.25 4.75 14.563 -.25 -7.25
  [3,15,14.563,-.25,4.75,13.063,-.25,4.75,14.563,-.25,-7.25],
// 3 15 13.063 -.25 6.25 11.45 -.25 4.75 13.063 -.25 4.75
  [3,15,13.063,-.25,6.25,11.45,-.25,4.75,13.063,-.25,4.75],
// 4 15 1.438 -.25 6.25 7.25 -.25 4.75 11.45 -.25 4.75 13.063 -.25 6.25
  [4,15,1.438,-.25,6.25,7.25,-.25,4.75,11.45,-.25,4.75,13.063,-.25,6.25],
// 3 15 7.25 -.25 4.75 1.438 -.25 6.25 3.05 -.25 4.75
  [3,15,7.25,-.25,4.75,1.438,-.25,6.25,3.05,-.25,4.75],
];
module ldraw_lib__821435e(step=0, col=false, unit=2/5, alt=false, line=0.2, solid=!$preview)
    makepoly(ldraw_lib__821435e(), step=step, col=col, unit=unit, alt=alt, line=line, solid=solid);
ldraw_lib__821435e(line=0.2);
